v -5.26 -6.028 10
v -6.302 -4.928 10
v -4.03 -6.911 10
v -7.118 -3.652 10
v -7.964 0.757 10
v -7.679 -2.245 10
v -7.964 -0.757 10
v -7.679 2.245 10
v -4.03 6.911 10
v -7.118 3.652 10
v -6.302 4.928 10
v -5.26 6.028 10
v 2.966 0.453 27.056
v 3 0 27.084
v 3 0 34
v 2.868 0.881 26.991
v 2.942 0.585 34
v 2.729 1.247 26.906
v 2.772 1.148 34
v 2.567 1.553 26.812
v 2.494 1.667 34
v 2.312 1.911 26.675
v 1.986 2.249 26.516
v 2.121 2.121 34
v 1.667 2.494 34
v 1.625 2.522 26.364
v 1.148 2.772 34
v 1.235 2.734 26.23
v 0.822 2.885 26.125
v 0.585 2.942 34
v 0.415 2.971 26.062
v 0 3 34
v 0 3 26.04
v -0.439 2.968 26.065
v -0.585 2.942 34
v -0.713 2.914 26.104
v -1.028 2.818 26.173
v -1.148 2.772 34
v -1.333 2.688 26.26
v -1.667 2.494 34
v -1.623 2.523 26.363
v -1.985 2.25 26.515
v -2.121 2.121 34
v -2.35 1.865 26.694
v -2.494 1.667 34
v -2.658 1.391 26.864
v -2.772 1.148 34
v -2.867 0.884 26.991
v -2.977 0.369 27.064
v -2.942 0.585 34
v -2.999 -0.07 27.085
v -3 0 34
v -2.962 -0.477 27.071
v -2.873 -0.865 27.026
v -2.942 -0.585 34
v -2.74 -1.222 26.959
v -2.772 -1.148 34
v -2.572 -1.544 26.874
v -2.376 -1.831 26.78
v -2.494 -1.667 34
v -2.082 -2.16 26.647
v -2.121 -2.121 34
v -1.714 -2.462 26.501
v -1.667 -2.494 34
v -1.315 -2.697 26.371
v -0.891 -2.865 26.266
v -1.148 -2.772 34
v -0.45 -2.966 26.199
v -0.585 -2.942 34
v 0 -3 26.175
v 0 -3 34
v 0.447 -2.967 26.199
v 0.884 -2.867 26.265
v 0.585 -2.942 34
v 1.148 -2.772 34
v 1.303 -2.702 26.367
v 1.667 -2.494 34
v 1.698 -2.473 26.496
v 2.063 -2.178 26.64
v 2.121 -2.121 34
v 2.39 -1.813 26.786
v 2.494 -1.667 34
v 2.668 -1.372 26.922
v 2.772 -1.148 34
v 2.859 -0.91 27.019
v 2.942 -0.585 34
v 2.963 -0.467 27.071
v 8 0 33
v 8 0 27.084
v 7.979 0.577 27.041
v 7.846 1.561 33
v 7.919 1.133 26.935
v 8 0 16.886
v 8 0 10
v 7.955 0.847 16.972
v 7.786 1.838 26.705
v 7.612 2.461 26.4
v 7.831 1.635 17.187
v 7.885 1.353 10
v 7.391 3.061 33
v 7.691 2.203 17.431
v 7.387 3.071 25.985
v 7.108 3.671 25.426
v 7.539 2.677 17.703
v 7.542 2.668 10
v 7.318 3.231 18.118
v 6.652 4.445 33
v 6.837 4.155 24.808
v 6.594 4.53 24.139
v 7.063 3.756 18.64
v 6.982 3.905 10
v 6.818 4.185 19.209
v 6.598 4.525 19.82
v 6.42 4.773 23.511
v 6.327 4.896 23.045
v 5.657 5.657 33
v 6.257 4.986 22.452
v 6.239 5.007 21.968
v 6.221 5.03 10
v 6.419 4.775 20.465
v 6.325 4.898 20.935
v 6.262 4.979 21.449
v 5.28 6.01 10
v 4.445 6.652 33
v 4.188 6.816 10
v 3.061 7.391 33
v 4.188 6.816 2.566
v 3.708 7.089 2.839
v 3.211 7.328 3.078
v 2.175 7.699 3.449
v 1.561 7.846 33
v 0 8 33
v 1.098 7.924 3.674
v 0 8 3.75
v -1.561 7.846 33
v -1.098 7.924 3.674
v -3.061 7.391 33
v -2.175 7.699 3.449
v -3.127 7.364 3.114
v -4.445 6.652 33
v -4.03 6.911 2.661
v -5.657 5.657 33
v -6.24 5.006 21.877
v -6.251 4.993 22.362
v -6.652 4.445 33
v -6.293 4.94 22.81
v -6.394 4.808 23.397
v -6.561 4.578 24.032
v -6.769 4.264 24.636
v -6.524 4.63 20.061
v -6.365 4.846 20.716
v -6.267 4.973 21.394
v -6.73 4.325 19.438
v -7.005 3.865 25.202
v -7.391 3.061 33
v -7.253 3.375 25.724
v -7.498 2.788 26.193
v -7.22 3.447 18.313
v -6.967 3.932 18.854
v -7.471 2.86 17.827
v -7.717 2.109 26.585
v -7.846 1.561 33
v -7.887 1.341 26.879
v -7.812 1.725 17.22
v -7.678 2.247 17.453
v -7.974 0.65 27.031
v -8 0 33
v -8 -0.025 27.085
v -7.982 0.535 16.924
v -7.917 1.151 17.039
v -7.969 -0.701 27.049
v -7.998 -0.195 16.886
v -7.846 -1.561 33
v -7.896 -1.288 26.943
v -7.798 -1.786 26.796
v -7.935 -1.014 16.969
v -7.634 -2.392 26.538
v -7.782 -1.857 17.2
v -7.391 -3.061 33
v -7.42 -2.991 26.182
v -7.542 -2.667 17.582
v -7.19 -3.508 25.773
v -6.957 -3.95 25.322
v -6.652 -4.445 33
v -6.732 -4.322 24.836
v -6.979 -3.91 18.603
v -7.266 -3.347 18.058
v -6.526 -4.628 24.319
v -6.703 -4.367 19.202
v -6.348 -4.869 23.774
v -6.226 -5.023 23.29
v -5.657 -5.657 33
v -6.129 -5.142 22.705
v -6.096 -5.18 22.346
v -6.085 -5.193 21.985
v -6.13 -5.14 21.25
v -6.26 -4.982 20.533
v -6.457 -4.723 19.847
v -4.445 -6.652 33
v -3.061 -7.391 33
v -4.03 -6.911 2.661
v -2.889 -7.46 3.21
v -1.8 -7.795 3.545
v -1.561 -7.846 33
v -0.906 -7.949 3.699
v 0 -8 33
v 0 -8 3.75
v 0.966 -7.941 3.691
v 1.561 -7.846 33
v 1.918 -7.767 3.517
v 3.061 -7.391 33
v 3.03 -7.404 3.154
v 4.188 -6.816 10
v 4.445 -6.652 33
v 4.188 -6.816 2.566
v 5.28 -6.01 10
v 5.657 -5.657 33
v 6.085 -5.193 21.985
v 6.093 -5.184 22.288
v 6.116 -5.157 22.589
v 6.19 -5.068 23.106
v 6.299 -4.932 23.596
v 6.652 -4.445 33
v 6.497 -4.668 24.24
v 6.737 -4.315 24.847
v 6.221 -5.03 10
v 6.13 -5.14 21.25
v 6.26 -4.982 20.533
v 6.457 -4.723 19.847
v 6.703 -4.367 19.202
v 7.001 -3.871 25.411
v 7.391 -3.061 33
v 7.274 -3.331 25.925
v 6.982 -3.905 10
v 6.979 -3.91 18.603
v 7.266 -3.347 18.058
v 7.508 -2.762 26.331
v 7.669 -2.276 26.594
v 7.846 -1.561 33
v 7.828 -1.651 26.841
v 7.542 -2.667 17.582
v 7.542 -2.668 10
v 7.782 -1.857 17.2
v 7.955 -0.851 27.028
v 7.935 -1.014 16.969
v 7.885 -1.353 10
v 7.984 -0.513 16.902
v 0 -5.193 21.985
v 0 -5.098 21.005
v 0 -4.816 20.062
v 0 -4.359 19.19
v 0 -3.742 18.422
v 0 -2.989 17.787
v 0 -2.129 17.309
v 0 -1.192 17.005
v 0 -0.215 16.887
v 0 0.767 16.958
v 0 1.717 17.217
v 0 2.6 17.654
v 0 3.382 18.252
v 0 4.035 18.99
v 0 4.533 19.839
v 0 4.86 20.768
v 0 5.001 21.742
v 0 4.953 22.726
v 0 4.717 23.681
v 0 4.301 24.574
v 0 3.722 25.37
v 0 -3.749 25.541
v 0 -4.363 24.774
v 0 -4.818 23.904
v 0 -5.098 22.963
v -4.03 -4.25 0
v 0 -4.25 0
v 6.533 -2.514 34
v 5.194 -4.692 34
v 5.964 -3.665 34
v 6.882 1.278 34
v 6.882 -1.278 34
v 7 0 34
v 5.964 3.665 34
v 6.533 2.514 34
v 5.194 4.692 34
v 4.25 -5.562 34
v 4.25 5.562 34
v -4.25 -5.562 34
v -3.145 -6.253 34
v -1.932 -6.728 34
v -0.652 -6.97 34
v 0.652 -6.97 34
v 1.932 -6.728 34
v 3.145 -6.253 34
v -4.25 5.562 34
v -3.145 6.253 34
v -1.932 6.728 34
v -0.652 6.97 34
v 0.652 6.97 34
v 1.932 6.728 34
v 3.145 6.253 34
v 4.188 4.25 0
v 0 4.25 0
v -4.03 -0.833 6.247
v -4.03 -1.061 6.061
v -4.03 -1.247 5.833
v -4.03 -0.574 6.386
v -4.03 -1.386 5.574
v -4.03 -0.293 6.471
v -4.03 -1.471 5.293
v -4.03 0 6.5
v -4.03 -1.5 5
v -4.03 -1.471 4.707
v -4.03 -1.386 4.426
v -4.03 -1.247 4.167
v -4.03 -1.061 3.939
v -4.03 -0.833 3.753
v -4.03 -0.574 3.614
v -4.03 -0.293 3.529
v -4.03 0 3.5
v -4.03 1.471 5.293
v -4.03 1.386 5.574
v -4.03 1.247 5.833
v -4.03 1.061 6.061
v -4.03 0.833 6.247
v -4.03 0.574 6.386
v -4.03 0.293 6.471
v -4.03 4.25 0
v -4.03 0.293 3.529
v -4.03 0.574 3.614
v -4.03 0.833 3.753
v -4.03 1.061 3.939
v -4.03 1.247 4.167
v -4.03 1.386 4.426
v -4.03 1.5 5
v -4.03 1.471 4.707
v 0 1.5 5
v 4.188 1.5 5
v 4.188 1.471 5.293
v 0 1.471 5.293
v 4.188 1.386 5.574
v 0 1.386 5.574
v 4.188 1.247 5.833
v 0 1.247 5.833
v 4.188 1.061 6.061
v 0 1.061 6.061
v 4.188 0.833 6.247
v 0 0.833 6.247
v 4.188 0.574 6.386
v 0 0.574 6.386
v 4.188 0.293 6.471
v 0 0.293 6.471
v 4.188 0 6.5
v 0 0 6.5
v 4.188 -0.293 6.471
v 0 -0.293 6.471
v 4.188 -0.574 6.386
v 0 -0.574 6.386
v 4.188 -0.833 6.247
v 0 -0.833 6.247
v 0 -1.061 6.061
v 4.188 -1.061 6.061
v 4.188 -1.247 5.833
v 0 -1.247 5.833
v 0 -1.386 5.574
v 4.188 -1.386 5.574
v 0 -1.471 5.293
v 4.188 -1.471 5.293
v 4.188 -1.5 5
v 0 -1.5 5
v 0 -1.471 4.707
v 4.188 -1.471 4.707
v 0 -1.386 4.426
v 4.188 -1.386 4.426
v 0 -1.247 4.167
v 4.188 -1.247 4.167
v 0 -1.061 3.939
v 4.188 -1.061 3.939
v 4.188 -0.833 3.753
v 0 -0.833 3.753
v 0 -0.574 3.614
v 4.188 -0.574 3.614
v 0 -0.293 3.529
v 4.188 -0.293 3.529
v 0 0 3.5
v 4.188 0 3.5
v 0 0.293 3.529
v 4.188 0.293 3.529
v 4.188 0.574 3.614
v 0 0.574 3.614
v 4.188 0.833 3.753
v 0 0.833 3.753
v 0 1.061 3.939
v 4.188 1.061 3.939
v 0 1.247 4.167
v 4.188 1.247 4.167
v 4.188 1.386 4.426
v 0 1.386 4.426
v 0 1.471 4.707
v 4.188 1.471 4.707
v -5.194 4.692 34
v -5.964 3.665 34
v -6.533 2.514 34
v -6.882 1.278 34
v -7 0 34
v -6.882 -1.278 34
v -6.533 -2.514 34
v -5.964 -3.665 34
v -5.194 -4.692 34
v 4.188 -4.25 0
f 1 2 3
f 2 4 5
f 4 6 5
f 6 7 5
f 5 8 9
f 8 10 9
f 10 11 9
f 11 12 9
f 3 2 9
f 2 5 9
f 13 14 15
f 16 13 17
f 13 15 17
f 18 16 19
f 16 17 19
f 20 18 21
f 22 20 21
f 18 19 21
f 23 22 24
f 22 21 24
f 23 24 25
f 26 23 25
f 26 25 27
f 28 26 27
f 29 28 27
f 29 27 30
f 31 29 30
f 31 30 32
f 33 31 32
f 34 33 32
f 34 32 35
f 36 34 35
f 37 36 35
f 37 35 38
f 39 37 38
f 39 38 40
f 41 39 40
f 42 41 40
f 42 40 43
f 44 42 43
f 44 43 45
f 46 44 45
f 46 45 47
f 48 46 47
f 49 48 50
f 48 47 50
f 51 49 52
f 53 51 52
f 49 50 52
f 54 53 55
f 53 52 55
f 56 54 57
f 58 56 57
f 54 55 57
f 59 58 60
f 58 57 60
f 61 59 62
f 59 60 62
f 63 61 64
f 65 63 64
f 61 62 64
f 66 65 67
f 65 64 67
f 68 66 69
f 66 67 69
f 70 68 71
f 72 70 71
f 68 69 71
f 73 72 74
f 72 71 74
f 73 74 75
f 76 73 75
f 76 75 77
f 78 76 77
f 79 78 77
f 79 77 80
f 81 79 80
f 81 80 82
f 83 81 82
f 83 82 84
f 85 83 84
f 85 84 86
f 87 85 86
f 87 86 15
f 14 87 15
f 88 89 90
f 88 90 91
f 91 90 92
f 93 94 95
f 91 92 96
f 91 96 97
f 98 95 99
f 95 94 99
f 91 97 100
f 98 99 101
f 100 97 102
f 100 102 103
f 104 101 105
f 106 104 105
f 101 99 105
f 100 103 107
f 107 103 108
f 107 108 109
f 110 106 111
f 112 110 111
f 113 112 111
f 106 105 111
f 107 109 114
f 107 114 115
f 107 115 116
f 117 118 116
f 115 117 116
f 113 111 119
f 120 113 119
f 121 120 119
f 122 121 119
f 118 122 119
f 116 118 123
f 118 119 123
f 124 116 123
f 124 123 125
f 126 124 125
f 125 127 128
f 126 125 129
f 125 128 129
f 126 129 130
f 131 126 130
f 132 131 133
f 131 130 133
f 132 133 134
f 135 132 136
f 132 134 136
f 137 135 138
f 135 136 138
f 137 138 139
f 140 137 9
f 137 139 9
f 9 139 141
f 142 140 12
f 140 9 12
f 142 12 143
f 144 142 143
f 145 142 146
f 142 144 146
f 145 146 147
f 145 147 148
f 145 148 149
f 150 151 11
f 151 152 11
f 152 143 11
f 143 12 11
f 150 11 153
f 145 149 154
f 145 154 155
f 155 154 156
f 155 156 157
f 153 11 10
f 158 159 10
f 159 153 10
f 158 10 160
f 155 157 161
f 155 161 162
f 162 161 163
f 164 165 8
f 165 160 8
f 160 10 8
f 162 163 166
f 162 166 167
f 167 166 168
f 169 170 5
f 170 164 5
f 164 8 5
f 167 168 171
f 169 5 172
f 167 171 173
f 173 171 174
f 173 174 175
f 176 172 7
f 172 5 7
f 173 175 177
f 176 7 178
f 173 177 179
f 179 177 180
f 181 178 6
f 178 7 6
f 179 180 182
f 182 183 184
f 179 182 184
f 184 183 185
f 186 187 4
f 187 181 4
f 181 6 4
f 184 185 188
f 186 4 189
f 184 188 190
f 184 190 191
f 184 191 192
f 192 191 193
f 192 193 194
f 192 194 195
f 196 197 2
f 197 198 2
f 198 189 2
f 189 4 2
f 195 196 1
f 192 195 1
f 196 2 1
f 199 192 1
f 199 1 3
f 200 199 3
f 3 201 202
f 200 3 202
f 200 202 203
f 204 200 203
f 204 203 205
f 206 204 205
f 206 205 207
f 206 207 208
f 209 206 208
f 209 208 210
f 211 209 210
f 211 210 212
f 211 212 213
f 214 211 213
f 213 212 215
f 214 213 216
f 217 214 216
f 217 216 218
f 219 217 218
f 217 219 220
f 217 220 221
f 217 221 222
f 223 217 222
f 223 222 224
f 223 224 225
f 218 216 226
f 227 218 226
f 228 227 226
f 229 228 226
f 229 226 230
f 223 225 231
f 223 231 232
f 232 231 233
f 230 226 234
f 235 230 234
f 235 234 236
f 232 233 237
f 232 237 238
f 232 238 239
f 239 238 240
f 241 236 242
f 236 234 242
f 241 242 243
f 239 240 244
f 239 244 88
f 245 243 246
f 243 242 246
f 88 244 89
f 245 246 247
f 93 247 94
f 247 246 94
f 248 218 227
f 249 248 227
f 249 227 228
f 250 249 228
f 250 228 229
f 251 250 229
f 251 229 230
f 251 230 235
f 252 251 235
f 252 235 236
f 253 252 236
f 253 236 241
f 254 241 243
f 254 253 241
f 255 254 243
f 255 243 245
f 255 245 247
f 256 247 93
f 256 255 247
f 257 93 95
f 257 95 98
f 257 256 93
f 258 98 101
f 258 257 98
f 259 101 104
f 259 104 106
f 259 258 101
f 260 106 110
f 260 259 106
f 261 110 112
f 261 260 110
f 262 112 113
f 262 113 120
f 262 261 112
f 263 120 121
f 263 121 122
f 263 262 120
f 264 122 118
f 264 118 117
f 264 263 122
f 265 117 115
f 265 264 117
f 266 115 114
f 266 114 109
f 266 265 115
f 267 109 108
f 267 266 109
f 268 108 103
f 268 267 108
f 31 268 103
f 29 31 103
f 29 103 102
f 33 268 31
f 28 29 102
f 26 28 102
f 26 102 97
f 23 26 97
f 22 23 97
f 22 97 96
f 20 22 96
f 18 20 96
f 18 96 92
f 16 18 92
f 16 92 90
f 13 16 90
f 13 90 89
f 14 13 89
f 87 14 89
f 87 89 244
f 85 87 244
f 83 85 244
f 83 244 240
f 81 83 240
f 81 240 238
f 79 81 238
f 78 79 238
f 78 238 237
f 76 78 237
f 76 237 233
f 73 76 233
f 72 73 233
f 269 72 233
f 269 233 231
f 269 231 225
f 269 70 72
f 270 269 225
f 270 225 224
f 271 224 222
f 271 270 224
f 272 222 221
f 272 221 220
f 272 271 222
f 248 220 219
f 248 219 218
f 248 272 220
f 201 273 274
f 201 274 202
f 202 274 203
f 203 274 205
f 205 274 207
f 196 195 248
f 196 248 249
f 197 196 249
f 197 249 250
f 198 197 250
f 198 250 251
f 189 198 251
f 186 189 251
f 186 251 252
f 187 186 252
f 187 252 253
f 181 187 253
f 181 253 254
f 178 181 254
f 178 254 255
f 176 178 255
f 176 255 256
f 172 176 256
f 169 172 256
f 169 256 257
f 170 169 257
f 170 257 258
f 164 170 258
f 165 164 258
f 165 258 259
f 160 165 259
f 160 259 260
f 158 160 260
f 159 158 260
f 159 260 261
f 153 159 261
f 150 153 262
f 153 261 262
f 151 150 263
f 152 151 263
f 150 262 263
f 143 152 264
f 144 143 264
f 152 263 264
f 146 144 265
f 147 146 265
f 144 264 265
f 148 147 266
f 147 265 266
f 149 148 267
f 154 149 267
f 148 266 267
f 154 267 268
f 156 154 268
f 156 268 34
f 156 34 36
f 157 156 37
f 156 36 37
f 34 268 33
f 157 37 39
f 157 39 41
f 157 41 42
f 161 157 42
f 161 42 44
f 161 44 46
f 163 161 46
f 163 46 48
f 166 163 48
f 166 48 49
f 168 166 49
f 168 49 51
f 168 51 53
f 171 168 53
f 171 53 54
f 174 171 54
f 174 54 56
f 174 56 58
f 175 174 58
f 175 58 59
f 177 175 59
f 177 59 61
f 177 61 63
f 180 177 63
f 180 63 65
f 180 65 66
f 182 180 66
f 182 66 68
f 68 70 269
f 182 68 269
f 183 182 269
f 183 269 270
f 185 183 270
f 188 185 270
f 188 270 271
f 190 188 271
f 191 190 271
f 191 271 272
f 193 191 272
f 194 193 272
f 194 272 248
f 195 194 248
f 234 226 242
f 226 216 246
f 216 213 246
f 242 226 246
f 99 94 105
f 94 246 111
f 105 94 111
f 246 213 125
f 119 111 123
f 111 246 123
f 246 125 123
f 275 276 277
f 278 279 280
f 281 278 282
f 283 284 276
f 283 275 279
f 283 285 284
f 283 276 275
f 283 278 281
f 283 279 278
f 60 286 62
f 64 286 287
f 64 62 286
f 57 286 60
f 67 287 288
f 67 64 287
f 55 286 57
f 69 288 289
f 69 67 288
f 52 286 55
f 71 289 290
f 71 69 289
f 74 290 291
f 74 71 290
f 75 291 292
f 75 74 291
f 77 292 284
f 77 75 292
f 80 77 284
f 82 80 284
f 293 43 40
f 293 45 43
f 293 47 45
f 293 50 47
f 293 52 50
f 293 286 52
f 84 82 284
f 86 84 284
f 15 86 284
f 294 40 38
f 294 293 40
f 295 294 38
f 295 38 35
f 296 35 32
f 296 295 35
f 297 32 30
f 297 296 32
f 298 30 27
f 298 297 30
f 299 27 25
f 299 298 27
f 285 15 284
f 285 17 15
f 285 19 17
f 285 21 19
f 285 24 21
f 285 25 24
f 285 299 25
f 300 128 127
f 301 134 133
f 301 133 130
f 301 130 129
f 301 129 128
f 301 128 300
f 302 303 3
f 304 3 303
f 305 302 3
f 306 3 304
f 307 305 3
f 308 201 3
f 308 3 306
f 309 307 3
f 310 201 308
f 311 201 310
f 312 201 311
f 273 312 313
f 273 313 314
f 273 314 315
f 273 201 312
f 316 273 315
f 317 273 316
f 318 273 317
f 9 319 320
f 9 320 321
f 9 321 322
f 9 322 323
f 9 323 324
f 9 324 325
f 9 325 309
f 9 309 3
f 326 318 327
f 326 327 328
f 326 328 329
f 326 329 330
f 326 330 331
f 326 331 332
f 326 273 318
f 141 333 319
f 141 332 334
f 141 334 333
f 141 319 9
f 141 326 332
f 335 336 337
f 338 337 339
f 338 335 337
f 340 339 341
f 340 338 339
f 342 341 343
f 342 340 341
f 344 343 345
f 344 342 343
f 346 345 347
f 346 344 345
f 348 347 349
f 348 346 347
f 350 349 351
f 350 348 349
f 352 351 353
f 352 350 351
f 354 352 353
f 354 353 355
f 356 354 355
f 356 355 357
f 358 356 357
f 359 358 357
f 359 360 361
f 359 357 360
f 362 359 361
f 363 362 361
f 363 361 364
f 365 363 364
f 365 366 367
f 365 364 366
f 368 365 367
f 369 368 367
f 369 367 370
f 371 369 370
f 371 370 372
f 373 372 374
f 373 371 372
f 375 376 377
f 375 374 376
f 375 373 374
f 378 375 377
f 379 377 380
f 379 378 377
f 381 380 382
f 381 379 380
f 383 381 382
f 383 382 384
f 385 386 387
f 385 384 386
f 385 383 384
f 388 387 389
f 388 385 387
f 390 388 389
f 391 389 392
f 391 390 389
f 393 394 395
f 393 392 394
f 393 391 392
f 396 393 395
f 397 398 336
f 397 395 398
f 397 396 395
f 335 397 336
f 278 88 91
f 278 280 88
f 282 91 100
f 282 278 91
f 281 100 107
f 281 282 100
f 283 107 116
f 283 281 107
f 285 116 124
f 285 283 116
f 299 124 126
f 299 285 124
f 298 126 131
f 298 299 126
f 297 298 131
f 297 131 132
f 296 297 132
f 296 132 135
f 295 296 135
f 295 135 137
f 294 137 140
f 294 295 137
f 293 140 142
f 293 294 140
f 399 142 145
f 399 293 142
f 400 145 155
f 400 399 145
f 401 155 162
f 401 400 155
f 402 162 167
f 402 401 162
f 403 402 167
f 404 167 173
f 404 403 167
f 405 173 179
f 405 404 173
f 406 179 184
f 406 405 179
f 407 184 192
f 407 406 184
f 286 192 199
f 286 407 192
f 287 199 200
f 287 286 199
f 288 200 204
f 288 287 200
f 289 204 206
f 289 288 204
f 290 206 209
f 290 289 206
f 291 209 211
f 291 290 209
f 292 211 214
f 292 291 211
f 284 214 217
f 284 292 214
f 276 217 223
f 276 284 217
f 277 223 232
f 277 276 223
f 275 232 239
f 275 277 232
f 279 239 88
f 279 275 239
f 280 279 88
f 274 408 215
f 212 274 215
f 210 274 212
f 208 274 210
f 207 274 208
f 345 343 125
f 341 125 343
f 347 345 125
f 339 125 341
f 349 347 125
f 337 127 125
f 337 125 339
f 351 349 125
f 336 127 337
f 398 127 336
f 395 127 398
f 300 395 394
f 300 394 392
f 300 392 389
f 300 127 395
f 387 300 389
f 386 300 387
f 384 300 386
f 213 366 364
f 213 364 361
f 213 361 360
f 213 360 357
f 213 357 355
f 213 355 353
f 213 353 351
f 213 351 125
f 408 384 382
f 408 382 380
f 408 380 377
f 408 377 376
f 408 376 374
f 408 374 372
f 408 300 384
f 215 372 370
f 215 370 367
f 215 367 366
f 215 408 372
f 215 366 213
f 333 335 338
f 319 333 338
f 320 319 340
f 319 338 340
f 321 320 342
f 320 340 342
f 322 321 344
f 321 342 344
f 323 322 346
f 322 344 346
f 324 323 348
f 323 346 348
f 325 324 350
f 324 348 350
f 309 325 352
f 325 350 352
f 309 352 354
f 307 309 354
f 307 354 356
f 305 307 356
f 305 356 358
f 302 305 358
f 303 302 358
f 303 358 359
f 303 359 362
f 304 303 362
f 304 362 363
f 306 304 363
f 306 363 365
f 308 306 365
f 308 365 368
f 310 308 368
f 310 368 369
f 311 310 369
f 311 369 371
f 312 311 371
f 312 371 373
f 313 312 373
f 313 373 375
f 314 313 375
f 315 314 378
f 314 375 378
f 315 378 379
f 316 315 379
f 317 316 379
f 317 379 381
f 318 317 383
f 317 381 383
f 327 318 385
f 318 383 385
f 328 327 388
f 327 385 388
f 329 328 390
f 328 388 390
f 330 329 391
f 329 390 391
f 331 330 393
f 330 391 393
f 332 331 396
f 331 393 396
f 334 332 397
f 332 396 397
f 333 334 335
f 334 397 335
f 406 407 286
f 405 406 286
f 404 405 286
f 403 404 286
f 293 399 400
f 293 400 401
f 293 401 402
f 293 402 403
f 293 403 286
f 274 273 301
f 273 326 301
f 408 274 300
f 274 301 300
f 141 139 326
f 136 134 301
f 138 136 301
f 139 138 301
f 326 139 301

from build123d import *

# Parameters (mm, degrees)
F0_R           = 8
F1_DEPTH       = 34
F3_DEPTH       = 100
F5_DEPTH       = 8.0010001
F5_DEPTH_BACK  = 50
F7_SIZE2       = 1
F7_SIZE        = 1
F8_R           = 1.5
F9_DEPTH       = 50
F9_DEPTH_BACK  = 50
F11_DEPTH      = 50
F11_DEPTH_BACK = 50
F12_R          = 3
F13_DEPTH      = 12
F15_DEPTH      = 10
F17_DEPTH      = 10


with BuildPart() as f1:
    # F0 (on Top) → F1 (new body)
    with BuildSketch(Plane.XY):
        Circle(F0_R)
    extrude(amount=F1_DEPTH)

    # F2 (on Right) → F3 (cut)
    with BuildSketch(Plane.YZ):
        with BuildLine():
            ThreePointArc((4.5470095179, 22.0663473532), (0, 26.613356871), (-4.5470095179, 22.0663473532))
            Line((-4.5470095179, 22.0663473532), (4.5470095179, 22.0663473532))
        make_face()
        with BuildLine():
            Line((4.5470095179, 22.0663473532), (-4.5470095179, 22.0663473532))
            ThreePointArc((-4.5470095179, 22.0663473532), (0, 17.5193378353), (4.5470095179, 22.0663473532))
        make_face()
    extrude(amount=-F3_DEPTH, mode=Mode.SUBTRACT)

    # F4 (on Right) → F5 (cut, two sides)
    with BuildSketch(Plane.YZ) as f5_sk:
        with BuildLine():
            ThreePointArc((5.006999059, 21.9850950465), (-0.093000941, 27.0850950465), (-5.193000941, 21.9850950465))
            Line((-5.193000941, 21.9850950465), (5.006999059, 21.9850950465))
        make_face()
        with BuildLine():
            Line((5.006999059, 21.9850950465), (-5.193000941, 21.9850950465))
            ThreePointArc((-5.193000941, 21.9850950465), (-0.093000941, 16.8850950465), (5.006999059, 21.9850950465))
        make_face()
    extrude(amount=F5_DEPTH, mode=Mode.SUBTRACT)
    extrude(f5_sk.sketch, amount=-F5_DEPTH_BACK, mode=Mode.SUBTRACT)

    # F7
    f7_edges = [f1.edges().sort_by_distance(p)[0] for p in [
        (-8, 0, 34),
    ]]
    chamfer(f7_edges, length=F7_SIZE, length2=F7_SIZE2)

    # F8 (on Right) → F9 (cut, two sides)
    with BuildSketch(Plane.YZ) as f9_sk:
        with Locations((0, 5)):
            Circle(F8_R)
    extrude(amount=-F9_DEPTH, mode=Mode.SUBTRACT)
    extrude(f9_sk.sketch, amount=F9_DEPTH_BACK, mode=Mode.SUBTRACT)

    # F10 (on Right) → F11 (cut, two sides)
    with BuildSketch(Plane.YZ) as f11_sk:
        Polygon((8.5644535553, 4.3144535553), (4.25, 0), (8.5644535553, 0), align=None)
        Polygon((-8.5644535553, 4.3144535553), (-8.5644535553, 0), (-4.25, 0), align=None)
    extrude(amount=-F11_DEPTH, mode=Mode.SUBTRACT)
    extrude(f11_sk.sketch, amount=F11_DEPTH_BACK, mode=Mode.SUBTRACT)

    # F12 (on face) → F13 (cut)
    with BuildSketch(Plane.XY.offset(34)):
        Circle(F12_R)
    extrude(amount=-F13_DEPTH, mode=Mode.SUBTRACT)

    # F14 (on face) → F15 (cut)
    with BuildSketch(Plane.XY.offset(34)):
        Polygon((-4.25, -8.8976696134), (-4.25, 0), (-4.25, 8.1088971347), (-12.2155025601, 8.1088971347), (-12.2155025601, -9.0591032058), align=None)
        Polygon((4.25, 8.1645697355), (4.25, 0), (4.25, -8.8976696134), (9.4557348639, -8.8976696134), (9.4557348639, 8.1645697355), align=None)
    extrude(amount=F15_DEPTH, mode=Mode.SUBTRACT)

    # F16 (on Top) → F17 (cut)
    with BuildSketch(Plane.XY):
        Polygon((-8.8066291064, -8.1897312775), (-4.0295359638, -8.1897312775), (-4.0295359638, 0), (-4.0295359638, 8.8079171255), (-8.8066291064, 8.8079171255), align=None)
        Polygon((4.1875811294, 0), (4.1875811294, -9.2414822429), (9.3784797937, -9.2414822429), (9.3784797937, 8.8079171255), (4.1875811294, 8.8079171255), align=None)
    extrude(amount=F17_DEPTH, mode=Mode.SUBTRACT)


solid = f1.part
